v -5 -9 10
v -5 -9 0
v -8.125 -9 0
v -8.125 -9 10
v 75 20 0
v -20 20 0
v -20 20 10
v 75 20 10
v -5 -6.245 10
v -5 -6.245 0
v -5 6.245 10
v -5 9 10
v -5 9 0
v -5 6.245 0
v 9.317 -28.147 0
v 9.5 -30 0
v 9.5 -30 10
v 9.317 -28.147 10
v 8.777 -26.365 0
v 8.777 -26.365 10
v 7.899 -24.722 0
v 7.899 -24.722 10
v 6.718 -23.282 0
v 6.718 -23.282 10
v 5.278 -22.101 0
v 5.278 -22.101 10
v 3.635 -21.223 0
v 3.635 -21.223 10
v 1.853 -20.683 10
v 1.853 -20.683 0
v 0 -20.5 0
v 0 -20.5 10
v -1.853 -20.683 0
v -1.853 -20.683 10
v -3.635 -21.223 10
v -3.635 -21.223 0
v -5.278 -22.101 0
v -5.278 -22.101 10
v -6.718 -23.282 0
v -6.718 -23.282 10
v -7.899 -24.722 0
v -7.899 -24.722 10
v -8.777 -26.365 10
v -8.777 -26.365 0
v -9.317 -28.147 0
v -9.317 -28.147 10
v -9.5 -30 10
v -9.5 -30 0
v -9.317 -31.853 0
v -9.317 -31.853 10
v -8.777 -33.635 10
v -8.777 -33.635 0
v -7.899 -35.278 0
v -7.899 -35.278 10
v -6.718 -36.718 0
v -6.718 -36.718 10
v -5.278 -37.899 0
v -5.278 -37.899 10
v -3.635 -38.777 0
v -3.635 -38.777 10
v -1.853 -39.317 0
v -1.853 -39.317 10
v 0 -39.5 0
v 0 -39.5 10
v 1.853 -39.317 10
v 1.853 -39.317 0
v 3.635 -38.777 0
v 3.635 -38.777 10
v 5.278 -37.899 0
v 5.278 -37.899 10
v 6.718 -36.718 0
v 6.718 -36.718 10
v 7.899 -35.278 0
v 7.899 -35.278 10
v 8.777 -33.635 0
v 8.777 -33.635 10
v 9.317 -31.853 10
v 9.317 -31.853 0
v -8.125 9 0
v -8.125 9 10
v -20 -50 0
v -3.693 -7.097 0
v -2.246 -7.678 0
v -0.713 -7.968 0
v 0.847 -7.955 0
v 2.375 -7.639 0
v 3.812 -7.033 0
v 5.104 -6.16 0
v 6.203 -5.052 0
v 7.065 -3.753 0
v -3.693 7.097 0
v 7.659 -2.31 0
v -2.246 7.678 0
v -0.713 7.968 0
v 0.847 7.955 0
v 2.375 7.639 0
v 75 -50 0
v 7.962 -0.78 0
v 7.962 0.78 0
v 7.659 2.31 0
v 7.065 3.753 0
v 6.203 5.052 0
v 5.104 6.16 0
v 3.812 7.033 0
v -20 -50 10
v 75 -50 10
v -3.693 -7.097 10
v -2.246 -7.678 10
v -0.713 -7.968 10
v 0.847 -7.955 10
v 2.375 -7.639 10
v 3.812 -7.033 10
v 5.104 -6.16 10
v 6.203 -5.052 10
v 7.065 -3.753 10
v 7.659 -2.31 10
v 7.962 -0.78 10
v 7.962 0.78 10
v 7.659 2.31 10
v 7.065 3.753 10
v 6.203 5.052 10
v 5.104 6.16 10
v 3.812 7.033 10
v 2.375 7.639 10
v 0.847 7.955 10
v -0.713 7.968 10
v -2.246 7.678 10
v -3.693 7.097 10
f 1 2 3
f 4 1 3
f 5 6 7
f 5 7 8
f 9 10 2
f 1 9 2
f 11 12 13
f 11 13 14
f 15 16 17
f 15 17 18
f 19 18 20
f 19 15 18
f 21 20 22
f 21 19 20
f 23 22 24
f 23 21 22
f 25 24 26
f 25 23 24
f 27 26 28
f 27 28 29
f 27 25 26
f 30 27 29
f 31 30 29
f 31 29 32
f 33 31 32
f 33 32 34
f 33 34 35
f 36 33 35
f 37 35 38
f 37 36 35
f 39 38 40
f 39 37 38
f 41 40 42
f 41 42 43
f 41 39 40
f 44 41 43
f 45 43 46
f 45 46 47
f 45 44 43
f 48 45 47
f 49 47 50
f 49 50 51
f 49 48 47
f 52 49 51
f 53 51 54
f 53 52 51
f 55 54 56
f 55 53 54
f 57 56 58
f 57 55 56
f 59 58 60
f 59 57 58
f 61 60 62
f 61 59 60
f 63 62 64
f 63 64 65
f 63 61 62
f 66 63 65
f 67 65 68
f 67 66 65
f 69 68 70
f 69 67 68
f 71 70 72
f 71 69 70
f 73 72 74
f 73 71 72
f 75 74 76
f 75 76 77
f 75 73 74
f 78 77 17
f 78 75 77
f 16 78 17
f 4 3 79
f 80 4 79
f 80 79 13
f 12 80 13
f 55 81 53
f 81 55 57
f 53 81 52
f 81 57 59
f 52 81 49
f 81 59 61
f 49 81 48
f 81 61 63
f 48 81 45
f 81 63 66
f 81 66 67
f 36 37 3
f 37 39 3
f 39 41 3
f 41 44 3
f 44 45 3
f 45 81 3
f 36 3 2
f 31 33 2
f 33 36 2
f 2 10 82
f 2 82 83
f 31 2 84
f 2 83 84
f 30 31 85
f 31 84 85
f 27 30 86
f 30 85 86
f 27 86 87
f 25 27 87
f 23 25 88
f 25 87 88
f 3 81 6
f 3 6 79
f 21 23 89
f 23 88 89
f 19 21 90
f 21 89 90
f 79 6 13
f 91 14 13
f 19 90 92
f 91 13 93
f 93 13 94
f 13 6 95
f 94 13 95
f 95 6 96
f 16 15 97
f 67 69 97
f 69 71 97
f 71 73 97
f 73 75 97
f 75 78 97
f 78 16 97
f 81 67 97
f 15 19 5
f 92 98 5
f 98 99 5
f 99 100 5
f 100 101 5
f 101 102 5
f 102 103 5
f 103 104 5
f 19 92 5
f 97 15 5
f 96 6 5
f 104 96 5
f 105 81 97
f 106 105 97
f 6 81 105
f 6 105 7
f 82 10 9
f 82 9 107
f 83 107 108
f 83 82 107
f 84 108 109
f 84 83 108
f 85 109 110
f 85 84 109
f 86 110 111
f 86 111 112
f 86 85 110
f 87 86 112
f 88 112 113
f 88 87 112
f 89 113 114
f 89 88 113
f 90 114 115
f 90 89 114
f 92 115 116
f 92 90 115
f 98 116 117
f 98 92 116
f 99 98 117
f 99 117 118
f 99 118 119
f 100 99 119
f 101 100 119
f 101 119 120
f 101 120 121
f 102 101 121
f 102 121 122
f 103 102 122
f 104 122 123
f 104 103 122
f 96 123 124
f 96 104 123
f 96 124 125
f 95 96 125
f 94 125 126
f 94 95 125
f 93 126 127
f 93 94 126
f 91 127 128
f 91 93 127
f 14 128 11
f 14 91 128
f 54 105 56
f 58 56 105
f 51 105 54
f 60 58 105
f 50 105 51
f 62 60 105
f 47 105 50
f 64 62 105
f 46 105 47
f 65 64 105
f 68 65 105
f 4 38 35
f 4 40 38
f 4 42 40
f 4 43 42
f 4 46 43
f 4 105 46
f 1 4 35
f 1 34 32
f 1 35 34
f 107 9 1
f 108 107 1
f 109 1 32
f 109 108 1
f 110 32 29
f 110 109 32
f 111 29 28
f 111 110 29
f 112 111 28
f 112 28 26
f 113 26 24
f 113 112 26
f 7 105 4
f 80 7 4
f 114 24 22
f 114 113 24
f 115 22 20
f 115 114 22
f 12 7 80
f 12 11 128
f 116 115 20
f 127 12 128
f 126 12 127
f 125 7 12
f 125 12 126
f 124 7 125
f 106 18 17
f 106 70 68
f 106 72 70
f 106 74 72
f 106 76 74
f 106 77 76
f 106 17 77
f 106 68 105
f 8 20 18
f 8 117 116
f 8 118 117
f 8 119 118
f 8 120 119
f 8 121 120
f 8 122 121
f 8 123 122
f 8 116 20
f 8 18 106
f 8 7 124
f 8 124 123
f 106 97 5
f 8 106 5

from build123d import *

# Parameters (mm, degrees)
SKETCH_W  = 95
SKETCH_H  = 70
SKETCH_R  = 9.5
PAD_DEPTH = 10


with BuildPart() as part:
    # Sketch → Pad (new body)
    with BuildSketch(Plane.XY):
        with Locations((27.5, -15)):
            Rectangle(SKETCH_W, SKETCH_H)
        with Locations((0, -30)):
            Circle(SKETCH_R, mode=Mode.SUBTRACT)
        with BuildLine():
            ThreePointArc((-5, -6.244998), (8, 0), (-5, 6.244998))
            Line((-5, 9), (-5, 6.244998))
            Line((-8.125, 9), (-5, 9))
            Line((-8.125, -9), (-8.125, 9))
            Line((-5, -9), (-8.125, -9))
            Line((-5, -6.244998), (-5, -9))
        make_face(mode=Mode.SUBTRACT)
    extrude(amount=PAD_DEPTH)


solid = part.part
